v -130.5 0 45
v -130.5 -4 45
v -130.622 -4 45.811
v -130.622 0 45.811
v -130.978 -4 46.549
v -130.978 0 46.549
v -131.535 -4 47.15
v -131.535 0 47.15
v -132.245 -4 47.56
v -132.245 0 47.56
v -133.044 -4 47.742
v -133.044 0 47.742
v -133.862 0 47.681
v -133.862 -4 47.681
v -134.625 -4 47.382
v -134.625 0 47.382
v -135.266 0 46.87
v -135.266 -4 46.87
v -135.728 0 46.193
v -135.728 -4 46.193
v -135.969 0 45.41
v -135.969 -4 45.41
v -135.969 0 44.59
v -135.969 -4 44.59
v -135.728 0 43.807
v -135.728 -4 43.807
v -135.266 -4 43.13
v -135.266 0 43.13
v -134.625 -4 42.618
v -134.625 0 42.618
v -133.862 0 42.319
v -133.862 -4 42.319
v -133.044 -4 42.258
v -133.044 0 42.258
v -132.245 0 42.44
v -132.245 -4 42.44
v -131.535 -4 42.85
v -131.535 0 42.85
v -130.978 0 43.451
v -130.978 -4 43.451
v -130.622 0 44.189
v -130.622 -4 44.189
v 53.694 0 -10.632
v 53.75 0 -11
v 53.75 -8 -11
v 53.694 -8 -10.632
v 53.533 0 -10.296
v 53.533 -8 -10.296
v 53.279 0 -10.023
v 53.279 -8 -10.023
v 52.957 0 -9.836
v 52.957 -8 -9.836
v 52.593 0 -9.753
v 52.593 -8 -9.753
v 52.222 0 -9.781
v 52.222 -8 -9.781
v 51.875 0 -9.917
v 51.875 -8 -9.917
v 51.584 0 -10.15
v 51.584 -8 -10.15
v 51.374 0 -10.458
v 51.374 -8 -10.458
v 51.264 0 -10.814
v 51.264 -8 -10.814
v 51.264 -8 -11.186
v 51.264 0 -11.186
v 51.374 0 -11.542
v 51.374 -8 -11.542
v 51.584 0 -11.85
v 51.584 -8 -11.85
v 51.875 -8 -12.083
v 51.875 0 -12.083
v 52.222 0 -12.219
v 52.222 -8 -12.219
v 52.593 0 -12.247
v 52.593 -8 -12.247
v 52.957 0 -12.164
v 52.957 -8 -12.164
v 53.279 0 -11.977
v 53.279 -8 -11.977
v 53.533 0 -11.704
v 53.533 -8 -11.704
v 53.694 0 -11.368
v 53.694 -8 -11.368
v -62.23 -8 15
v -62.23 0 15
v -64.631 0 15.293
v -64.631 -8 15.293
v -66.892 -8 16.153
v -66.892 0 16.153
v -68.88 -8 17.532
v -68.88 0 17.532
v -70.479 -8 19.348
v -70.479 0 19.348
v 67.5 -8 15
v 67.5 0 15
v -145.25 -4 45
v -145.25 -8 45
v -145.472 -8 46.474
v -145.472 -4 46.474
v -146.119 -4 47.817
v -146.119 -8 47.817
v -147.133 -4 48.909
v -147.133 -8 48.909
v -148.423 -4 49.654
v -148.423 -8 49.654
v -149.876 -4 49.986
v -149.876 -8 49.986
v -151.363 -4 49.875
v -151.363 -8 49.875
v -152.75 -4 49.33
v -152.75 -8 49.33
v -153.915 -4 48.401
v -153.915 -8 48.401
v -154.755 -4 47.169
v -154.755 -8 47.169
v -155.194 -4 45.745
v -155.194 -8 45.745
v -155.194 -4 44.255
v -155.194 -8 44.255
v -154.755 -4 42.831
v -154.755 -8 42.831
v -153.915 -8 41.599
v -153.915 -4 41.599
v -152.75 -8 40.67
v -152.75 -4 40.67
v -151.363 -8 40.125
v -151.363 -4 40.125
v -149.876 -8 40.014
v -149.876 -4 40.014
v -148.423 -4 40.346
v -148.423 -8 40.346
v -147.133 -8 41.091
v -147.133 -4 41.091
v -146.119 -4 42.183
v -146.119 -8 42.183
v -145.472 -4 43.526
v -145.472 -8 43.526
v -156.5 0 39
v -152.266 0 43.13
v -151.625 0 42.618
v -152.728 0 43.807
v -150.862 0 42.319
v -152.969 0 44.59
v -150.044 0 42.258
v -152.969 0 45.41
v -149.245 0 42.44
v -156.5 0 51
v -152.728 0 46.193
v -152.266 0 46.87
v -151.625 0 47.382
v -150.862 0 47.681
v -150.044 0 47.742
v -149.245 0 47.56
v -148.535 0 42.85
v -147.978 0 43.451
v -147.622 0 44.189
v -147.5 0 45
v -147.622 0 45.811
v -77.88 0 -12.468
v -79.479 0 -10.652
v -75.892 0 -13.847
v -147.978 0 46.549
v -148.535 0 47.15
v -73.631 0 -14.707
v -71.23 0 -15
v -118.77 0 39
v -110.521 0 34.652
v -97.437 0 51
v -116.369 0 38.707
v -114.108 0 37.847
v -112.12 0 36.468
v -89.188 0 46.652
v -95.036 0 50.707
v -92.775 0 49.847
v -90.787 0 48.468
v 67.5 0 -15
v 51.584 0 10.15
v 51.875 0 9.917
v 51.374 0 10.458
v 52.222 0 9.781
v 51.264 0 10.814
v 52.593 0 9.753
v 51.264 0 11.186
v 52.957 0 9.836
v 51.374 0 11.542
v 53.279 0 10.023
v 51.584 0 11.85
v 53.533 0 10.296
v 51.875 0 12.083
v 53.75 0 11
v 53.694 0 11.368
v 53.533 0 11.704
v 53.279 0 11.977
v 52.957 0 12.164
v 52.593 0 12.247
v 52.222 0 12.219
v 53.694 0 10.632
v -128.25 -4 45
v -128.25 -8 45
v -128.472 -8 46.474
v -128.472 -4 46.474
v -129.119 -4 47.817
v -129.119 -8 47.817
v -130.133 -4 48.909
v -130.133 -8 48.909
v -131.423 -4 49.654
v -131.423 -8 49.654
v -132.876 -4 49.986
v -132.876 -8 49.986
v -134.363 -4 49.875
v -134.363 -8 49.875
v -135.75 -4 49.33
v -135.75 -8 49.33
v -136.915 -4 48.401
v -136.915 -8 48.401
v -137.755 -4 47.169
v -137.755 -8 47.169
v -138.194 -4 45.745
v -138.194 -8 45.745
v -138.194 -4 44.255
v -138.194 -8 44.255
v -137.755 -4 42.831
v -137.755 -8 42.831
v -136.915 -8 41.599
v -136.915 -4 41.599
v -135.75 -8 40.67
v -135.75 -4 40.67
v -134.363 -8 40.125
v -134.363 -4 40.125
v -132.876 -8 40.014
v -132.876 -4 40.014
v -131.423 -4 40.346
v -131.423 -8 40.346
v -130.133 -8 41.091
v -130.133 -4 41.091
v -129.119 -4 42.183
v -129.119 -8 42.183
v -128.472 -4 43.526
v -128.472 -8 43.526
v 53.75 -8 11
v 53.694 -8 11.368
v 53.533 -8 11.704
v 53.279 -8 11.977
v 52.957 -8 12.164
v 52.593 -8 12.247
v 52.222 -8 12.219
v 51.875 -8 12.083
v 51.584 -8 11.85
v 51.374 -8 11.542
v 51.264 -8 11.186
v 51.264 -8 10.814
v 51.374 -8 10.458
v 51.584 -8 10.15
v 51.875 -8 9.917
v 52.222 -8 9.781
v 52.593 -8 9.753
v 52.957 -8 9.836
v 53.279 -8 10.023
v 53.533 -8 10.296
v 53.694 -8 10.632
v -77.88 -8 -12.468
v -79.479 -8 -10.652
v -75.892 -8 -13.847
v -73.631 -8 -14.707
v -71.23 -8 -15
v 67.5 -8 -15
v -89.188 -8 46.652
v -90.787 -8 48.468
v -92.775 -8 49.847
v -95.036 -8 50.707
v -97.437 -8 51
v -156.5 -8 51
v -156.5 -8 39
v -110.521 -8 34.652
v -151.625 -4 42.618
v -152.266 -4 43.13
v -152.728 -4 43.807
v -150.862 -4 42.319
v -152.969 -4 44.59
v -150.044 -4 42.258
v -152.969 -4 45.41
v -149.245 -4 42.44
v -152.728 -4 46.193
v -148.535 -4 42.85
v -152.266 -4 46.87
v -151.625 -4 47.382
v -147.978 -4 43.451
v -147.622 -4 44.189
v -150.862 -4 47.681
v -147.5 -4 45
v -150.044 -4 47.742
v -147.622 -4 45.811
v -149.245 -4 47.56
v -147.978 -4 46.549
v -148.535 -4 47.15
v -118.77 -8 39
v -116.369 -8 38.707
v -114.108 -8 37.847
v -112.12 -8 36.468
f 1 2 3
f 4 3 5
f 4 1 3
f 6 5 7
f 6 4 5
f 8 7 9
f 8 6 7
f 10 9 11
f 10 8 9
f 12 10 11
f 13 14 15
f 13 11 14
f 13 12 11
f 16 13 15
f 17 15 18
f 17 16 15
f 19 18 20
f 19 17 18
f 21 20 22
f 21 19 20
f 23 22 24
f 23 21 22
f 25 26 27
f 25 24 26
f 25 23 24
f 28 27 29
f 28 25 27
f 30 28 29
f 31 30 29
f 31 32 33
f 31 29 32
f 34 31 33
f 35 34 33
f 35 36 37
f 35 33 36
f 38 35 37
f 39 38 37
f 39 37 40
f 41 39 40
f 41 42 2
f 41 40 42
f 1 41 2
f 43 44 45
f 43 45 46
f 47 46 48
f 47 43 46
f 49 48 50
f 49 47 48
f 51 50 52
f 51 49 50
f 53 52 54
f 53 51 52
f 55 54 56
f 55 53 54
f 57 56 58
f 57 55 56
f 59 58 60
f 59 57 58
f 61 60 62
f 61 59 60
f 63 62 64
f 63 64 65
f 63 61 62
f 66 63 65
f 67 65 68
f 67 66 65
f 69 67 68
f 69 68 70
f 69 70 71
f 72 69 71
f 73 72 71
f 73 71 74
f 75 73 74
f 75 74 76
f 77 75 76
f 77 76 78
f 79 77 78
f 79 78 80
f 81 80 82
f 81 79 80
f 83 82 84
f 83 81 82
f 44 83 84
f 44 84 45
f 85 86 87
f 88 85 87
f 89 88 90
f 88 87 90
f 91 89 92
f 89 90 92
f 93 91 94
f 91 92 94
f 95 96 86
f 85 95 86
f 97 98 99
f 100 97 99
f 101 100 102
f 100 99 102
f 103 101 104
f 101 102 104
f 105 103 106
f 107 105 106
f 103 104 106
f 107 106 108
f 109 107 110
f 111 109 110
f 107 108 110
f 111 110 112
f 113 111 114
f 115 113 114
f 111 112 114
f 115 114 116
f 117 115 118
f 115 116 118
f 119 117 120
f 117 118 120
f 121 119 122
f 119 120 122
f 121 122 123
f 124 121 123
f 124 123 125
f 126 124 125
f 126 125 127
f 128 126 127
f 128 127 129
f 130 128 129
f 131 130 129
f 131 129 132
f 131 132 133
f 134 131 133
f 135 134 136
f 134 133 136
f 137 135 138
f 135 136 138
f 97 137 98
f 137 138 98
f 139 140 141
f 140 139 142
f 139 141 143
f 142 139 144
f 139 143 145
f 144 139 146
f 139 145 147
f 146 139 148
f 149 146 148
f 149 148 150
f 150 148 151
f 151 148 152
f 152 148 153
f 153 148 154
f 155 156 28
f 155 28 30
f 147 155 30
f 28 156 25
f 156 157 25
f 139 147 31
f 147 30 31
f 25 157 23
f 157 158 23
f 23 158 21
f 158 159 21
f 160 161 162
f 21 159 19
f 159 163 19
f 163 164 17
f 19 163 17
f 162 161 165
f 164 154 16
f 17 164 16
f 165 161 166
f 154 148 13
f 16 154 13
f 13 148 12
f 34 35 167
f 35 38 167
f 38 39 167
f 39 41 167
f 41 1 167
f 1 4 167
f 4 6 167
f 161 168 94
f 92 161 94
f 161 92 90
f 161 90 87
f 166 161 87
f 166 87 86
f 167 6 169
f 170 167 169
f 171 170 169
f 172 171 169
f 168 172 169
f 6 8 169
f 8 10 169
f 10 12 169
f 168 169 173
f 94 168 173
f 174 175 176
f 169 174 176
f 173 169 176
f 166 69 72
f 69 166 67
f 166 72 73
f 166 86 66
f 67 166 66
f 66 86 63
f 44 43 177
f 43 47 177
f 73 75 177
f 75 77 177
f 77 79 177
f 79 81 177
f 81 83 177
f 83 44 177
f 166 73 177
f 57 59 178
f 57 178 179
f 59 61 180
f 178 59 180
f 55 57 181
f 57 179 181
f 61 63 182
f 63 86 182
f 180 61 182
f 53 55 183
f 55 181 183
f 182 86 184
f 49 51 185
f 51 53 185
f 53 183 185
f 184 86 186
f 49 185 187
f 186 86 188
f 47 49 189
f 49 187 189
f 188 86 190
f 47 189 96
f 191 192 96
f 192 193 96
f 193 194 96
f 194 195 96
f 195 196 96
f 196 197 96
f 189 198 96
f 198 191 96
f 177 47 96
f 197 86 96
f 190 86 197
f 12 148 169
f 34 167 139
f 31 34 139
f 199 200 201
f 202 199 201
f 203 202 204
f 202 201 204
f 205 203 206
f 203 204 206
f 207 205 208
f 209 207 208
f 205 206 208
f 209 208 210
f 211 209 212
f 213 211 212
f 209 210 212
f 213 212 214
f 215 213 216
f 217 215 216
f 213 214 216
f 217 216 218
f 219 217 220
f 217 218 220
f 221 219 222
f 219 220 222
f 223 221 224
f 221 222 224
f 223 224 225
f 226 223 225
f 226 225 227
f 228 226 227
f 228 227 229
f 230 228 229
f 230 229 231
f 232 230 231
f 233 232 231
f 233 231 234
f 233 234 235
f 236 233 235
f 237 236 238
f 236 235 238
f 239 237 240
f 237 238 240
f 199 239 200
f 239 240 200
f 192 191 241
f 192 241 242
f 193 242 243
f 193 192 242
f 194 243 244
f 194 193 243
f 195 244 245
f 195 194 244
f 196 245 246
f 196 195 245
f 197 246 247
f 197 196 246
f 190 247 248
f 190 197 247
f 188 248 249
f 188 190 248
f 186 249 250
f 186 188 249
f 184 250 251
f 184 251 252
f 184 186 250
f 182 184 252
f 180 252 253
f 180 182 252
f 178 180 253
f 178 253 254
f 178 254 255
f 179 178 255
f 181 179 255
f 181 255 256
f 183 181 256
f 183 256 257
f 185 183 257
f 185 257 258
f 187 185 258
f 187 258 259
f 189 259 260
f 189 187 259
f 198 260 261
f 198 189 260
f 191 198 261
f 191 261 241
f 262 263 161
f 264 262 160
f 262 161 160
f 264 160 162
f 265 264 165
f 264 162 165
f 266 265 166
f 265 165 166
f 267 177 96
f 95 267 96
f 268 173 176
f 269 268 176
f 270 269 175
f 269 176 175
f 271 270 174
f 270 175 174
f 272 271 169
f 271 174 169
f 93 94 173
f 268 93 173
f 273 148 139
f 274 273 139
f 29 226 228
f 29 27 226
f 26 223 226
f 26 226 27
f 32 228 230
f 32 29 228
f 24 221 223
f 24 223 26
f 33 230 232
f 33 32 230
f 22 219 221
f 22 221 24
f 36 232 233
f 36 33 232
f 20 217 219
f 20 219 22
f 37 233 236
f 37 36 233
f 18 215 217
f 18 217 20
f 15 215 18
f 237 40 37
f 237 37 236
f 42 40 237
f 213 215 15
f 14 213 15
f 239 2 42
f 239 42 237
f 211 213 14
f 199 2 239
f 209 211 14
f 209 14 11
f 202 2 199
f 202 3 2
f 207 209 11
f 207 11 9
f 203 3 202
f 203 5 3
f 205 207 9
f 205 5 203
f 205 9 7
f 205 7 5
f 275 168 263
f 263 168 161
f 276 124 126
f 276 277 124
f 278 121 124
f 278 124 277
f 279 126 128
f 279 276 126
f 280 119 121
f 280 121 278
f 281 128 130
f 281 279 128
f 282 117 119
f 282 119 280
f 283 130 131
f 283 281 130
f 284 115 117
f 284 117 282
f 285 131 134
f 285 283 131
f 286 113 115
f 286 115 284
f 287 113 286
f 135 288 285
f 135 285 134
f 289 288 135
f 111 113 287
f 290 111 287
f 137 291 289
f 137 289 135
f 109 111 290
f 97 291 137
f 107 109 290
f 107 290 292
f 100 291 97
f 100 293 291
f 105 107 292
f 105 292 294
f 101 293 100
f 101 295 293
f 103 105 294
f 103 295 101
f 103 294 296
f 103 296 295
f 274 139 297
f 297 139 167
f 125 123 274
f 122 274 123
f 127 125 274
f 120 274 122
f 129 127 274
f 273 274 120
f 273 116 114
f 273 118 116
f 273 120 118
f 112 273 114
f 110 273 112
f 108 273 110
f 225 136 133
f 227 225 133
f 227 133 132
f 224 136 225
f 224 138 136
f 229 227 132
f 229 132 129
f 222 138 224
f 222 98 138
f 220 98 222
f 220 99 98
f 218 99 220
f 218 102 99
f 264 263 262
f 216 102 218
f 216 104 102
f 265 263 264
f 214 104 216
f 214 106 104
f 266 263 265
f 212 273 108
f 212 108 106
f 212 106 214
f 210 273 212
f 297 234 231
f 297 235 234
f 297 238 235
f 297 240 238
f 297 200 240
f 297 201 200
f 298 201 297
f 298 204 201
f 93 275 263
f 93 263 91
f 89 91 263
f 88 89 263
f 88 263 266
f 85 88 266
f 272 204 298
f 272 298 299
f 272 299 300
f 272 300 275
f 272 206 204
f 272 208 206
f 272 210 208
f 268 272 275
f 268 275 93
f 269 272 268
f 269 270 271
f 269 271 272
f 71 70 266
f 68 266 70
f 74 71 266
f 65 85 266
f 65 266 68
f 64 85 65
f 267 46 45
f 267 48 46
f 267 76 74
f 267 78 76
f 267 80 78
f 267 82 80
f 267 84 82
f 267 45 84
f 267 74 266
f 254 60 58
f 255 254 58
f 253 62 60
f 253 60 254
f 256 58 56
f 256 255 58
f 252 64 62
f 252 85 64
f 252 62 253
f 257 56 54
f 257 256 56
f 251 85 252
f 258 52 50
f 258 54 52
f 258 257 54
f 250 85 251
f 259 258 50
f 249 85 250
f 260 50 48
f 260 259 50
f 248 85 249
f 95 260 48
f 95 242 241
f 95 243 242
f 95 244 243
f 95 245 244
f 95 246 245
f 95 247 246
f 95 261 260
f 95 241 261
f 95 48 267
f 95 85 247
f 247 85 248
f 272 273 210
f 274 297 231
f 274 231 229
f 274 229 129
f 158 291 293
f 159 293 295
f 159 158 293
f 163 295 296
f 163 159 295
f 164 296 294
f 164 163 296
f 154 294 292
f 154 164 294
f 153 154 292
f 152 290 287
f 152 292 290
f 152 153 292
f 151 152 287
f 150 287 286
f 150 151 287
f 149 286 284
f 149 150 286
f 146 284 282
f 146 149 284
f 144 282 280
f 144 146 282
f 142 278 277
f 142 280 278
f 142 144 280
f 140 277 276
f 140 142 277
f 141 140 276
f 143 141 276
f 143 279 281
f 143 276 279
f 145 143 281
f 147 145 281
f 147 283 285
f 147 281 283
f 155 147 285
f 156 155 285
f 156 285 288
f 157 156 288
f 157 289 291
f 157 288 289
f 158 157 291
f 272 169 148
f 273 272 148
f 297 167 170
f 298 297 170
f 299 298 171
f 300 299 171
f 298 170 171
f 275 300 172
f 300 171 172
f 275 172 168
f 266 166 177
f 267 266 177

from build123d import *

# Parameters (mm, degrees)
F0_R     = 1.25
F0_R_2   = 2.75
F1_DEPTH = 8
F2_R     = 5
F3_DEPTH = 4


with BuildPart() as f1:
    # F0 (on Front) → F1 (new body)
    with BuildSketch(Plane.XZ):
        with BuildLine():
            Line((67.5, -15), (67.5, 15))
            Line((67.5, 15), (-62.229646, 15))
            ThreePointArc((-62.229646, 15), (-66.892095, 16.153443), (-70.47897, 19.347686))
            Line((-70.47897, 19.347686), (-89.187697, 46.652314))
            ThreePointArc((-89.187697, 46.652314), (-92.774572, 49.846557), (-97.437021, 51))
            Line((-97.437021, 51), (-156.5, 51))
            Line((-156.5, 51), (-156.5, 39))
            Line((-156.5, 39), (-118.770354, 39))
            ThreePointArc((-118.770354, 39), (-114.107905, 37.846557), (-110.52103, 34.652314))
            Line((-110.52103, 34.652314), (-79.47897, -10.652314))
            ThreePointArc((-79.47897, -10.652314), (-75.892095, -13.846557), (-71.229646, -15))
            Line((-71.229646, -15), (67.5, -15))
        make_face()
        with Locations((52.5, -11)):
            Circle(F0_R, mode=Mode.SUBTRACT)
        with Locations((52.5, 11)):
            Circle(F0_R, mode=Mode.SUBTRACT)
        with Locations((-150.25, 45)):
            Circle(F0_R_2, mode=Mode.SUBTRACT)
        with Locations((-133.25, 45)):
            Circle(F0_R_2, mode=Mode.SUBTRACT)
    extrude(amount=F1_DEPTH)

    # F2 (on face) → F3 (cut)
    with BuildSketch(Plane.XZ.offset(8)):
        with Locations((-150.25, 45)):
            Circle(F2_R)
        with Locations((-133.25, 45)):
            Circle(F2_R)
    extrude(amount=-F3_DEPTH, mode=Mode.SUBTRACT)


solid = f1.part
